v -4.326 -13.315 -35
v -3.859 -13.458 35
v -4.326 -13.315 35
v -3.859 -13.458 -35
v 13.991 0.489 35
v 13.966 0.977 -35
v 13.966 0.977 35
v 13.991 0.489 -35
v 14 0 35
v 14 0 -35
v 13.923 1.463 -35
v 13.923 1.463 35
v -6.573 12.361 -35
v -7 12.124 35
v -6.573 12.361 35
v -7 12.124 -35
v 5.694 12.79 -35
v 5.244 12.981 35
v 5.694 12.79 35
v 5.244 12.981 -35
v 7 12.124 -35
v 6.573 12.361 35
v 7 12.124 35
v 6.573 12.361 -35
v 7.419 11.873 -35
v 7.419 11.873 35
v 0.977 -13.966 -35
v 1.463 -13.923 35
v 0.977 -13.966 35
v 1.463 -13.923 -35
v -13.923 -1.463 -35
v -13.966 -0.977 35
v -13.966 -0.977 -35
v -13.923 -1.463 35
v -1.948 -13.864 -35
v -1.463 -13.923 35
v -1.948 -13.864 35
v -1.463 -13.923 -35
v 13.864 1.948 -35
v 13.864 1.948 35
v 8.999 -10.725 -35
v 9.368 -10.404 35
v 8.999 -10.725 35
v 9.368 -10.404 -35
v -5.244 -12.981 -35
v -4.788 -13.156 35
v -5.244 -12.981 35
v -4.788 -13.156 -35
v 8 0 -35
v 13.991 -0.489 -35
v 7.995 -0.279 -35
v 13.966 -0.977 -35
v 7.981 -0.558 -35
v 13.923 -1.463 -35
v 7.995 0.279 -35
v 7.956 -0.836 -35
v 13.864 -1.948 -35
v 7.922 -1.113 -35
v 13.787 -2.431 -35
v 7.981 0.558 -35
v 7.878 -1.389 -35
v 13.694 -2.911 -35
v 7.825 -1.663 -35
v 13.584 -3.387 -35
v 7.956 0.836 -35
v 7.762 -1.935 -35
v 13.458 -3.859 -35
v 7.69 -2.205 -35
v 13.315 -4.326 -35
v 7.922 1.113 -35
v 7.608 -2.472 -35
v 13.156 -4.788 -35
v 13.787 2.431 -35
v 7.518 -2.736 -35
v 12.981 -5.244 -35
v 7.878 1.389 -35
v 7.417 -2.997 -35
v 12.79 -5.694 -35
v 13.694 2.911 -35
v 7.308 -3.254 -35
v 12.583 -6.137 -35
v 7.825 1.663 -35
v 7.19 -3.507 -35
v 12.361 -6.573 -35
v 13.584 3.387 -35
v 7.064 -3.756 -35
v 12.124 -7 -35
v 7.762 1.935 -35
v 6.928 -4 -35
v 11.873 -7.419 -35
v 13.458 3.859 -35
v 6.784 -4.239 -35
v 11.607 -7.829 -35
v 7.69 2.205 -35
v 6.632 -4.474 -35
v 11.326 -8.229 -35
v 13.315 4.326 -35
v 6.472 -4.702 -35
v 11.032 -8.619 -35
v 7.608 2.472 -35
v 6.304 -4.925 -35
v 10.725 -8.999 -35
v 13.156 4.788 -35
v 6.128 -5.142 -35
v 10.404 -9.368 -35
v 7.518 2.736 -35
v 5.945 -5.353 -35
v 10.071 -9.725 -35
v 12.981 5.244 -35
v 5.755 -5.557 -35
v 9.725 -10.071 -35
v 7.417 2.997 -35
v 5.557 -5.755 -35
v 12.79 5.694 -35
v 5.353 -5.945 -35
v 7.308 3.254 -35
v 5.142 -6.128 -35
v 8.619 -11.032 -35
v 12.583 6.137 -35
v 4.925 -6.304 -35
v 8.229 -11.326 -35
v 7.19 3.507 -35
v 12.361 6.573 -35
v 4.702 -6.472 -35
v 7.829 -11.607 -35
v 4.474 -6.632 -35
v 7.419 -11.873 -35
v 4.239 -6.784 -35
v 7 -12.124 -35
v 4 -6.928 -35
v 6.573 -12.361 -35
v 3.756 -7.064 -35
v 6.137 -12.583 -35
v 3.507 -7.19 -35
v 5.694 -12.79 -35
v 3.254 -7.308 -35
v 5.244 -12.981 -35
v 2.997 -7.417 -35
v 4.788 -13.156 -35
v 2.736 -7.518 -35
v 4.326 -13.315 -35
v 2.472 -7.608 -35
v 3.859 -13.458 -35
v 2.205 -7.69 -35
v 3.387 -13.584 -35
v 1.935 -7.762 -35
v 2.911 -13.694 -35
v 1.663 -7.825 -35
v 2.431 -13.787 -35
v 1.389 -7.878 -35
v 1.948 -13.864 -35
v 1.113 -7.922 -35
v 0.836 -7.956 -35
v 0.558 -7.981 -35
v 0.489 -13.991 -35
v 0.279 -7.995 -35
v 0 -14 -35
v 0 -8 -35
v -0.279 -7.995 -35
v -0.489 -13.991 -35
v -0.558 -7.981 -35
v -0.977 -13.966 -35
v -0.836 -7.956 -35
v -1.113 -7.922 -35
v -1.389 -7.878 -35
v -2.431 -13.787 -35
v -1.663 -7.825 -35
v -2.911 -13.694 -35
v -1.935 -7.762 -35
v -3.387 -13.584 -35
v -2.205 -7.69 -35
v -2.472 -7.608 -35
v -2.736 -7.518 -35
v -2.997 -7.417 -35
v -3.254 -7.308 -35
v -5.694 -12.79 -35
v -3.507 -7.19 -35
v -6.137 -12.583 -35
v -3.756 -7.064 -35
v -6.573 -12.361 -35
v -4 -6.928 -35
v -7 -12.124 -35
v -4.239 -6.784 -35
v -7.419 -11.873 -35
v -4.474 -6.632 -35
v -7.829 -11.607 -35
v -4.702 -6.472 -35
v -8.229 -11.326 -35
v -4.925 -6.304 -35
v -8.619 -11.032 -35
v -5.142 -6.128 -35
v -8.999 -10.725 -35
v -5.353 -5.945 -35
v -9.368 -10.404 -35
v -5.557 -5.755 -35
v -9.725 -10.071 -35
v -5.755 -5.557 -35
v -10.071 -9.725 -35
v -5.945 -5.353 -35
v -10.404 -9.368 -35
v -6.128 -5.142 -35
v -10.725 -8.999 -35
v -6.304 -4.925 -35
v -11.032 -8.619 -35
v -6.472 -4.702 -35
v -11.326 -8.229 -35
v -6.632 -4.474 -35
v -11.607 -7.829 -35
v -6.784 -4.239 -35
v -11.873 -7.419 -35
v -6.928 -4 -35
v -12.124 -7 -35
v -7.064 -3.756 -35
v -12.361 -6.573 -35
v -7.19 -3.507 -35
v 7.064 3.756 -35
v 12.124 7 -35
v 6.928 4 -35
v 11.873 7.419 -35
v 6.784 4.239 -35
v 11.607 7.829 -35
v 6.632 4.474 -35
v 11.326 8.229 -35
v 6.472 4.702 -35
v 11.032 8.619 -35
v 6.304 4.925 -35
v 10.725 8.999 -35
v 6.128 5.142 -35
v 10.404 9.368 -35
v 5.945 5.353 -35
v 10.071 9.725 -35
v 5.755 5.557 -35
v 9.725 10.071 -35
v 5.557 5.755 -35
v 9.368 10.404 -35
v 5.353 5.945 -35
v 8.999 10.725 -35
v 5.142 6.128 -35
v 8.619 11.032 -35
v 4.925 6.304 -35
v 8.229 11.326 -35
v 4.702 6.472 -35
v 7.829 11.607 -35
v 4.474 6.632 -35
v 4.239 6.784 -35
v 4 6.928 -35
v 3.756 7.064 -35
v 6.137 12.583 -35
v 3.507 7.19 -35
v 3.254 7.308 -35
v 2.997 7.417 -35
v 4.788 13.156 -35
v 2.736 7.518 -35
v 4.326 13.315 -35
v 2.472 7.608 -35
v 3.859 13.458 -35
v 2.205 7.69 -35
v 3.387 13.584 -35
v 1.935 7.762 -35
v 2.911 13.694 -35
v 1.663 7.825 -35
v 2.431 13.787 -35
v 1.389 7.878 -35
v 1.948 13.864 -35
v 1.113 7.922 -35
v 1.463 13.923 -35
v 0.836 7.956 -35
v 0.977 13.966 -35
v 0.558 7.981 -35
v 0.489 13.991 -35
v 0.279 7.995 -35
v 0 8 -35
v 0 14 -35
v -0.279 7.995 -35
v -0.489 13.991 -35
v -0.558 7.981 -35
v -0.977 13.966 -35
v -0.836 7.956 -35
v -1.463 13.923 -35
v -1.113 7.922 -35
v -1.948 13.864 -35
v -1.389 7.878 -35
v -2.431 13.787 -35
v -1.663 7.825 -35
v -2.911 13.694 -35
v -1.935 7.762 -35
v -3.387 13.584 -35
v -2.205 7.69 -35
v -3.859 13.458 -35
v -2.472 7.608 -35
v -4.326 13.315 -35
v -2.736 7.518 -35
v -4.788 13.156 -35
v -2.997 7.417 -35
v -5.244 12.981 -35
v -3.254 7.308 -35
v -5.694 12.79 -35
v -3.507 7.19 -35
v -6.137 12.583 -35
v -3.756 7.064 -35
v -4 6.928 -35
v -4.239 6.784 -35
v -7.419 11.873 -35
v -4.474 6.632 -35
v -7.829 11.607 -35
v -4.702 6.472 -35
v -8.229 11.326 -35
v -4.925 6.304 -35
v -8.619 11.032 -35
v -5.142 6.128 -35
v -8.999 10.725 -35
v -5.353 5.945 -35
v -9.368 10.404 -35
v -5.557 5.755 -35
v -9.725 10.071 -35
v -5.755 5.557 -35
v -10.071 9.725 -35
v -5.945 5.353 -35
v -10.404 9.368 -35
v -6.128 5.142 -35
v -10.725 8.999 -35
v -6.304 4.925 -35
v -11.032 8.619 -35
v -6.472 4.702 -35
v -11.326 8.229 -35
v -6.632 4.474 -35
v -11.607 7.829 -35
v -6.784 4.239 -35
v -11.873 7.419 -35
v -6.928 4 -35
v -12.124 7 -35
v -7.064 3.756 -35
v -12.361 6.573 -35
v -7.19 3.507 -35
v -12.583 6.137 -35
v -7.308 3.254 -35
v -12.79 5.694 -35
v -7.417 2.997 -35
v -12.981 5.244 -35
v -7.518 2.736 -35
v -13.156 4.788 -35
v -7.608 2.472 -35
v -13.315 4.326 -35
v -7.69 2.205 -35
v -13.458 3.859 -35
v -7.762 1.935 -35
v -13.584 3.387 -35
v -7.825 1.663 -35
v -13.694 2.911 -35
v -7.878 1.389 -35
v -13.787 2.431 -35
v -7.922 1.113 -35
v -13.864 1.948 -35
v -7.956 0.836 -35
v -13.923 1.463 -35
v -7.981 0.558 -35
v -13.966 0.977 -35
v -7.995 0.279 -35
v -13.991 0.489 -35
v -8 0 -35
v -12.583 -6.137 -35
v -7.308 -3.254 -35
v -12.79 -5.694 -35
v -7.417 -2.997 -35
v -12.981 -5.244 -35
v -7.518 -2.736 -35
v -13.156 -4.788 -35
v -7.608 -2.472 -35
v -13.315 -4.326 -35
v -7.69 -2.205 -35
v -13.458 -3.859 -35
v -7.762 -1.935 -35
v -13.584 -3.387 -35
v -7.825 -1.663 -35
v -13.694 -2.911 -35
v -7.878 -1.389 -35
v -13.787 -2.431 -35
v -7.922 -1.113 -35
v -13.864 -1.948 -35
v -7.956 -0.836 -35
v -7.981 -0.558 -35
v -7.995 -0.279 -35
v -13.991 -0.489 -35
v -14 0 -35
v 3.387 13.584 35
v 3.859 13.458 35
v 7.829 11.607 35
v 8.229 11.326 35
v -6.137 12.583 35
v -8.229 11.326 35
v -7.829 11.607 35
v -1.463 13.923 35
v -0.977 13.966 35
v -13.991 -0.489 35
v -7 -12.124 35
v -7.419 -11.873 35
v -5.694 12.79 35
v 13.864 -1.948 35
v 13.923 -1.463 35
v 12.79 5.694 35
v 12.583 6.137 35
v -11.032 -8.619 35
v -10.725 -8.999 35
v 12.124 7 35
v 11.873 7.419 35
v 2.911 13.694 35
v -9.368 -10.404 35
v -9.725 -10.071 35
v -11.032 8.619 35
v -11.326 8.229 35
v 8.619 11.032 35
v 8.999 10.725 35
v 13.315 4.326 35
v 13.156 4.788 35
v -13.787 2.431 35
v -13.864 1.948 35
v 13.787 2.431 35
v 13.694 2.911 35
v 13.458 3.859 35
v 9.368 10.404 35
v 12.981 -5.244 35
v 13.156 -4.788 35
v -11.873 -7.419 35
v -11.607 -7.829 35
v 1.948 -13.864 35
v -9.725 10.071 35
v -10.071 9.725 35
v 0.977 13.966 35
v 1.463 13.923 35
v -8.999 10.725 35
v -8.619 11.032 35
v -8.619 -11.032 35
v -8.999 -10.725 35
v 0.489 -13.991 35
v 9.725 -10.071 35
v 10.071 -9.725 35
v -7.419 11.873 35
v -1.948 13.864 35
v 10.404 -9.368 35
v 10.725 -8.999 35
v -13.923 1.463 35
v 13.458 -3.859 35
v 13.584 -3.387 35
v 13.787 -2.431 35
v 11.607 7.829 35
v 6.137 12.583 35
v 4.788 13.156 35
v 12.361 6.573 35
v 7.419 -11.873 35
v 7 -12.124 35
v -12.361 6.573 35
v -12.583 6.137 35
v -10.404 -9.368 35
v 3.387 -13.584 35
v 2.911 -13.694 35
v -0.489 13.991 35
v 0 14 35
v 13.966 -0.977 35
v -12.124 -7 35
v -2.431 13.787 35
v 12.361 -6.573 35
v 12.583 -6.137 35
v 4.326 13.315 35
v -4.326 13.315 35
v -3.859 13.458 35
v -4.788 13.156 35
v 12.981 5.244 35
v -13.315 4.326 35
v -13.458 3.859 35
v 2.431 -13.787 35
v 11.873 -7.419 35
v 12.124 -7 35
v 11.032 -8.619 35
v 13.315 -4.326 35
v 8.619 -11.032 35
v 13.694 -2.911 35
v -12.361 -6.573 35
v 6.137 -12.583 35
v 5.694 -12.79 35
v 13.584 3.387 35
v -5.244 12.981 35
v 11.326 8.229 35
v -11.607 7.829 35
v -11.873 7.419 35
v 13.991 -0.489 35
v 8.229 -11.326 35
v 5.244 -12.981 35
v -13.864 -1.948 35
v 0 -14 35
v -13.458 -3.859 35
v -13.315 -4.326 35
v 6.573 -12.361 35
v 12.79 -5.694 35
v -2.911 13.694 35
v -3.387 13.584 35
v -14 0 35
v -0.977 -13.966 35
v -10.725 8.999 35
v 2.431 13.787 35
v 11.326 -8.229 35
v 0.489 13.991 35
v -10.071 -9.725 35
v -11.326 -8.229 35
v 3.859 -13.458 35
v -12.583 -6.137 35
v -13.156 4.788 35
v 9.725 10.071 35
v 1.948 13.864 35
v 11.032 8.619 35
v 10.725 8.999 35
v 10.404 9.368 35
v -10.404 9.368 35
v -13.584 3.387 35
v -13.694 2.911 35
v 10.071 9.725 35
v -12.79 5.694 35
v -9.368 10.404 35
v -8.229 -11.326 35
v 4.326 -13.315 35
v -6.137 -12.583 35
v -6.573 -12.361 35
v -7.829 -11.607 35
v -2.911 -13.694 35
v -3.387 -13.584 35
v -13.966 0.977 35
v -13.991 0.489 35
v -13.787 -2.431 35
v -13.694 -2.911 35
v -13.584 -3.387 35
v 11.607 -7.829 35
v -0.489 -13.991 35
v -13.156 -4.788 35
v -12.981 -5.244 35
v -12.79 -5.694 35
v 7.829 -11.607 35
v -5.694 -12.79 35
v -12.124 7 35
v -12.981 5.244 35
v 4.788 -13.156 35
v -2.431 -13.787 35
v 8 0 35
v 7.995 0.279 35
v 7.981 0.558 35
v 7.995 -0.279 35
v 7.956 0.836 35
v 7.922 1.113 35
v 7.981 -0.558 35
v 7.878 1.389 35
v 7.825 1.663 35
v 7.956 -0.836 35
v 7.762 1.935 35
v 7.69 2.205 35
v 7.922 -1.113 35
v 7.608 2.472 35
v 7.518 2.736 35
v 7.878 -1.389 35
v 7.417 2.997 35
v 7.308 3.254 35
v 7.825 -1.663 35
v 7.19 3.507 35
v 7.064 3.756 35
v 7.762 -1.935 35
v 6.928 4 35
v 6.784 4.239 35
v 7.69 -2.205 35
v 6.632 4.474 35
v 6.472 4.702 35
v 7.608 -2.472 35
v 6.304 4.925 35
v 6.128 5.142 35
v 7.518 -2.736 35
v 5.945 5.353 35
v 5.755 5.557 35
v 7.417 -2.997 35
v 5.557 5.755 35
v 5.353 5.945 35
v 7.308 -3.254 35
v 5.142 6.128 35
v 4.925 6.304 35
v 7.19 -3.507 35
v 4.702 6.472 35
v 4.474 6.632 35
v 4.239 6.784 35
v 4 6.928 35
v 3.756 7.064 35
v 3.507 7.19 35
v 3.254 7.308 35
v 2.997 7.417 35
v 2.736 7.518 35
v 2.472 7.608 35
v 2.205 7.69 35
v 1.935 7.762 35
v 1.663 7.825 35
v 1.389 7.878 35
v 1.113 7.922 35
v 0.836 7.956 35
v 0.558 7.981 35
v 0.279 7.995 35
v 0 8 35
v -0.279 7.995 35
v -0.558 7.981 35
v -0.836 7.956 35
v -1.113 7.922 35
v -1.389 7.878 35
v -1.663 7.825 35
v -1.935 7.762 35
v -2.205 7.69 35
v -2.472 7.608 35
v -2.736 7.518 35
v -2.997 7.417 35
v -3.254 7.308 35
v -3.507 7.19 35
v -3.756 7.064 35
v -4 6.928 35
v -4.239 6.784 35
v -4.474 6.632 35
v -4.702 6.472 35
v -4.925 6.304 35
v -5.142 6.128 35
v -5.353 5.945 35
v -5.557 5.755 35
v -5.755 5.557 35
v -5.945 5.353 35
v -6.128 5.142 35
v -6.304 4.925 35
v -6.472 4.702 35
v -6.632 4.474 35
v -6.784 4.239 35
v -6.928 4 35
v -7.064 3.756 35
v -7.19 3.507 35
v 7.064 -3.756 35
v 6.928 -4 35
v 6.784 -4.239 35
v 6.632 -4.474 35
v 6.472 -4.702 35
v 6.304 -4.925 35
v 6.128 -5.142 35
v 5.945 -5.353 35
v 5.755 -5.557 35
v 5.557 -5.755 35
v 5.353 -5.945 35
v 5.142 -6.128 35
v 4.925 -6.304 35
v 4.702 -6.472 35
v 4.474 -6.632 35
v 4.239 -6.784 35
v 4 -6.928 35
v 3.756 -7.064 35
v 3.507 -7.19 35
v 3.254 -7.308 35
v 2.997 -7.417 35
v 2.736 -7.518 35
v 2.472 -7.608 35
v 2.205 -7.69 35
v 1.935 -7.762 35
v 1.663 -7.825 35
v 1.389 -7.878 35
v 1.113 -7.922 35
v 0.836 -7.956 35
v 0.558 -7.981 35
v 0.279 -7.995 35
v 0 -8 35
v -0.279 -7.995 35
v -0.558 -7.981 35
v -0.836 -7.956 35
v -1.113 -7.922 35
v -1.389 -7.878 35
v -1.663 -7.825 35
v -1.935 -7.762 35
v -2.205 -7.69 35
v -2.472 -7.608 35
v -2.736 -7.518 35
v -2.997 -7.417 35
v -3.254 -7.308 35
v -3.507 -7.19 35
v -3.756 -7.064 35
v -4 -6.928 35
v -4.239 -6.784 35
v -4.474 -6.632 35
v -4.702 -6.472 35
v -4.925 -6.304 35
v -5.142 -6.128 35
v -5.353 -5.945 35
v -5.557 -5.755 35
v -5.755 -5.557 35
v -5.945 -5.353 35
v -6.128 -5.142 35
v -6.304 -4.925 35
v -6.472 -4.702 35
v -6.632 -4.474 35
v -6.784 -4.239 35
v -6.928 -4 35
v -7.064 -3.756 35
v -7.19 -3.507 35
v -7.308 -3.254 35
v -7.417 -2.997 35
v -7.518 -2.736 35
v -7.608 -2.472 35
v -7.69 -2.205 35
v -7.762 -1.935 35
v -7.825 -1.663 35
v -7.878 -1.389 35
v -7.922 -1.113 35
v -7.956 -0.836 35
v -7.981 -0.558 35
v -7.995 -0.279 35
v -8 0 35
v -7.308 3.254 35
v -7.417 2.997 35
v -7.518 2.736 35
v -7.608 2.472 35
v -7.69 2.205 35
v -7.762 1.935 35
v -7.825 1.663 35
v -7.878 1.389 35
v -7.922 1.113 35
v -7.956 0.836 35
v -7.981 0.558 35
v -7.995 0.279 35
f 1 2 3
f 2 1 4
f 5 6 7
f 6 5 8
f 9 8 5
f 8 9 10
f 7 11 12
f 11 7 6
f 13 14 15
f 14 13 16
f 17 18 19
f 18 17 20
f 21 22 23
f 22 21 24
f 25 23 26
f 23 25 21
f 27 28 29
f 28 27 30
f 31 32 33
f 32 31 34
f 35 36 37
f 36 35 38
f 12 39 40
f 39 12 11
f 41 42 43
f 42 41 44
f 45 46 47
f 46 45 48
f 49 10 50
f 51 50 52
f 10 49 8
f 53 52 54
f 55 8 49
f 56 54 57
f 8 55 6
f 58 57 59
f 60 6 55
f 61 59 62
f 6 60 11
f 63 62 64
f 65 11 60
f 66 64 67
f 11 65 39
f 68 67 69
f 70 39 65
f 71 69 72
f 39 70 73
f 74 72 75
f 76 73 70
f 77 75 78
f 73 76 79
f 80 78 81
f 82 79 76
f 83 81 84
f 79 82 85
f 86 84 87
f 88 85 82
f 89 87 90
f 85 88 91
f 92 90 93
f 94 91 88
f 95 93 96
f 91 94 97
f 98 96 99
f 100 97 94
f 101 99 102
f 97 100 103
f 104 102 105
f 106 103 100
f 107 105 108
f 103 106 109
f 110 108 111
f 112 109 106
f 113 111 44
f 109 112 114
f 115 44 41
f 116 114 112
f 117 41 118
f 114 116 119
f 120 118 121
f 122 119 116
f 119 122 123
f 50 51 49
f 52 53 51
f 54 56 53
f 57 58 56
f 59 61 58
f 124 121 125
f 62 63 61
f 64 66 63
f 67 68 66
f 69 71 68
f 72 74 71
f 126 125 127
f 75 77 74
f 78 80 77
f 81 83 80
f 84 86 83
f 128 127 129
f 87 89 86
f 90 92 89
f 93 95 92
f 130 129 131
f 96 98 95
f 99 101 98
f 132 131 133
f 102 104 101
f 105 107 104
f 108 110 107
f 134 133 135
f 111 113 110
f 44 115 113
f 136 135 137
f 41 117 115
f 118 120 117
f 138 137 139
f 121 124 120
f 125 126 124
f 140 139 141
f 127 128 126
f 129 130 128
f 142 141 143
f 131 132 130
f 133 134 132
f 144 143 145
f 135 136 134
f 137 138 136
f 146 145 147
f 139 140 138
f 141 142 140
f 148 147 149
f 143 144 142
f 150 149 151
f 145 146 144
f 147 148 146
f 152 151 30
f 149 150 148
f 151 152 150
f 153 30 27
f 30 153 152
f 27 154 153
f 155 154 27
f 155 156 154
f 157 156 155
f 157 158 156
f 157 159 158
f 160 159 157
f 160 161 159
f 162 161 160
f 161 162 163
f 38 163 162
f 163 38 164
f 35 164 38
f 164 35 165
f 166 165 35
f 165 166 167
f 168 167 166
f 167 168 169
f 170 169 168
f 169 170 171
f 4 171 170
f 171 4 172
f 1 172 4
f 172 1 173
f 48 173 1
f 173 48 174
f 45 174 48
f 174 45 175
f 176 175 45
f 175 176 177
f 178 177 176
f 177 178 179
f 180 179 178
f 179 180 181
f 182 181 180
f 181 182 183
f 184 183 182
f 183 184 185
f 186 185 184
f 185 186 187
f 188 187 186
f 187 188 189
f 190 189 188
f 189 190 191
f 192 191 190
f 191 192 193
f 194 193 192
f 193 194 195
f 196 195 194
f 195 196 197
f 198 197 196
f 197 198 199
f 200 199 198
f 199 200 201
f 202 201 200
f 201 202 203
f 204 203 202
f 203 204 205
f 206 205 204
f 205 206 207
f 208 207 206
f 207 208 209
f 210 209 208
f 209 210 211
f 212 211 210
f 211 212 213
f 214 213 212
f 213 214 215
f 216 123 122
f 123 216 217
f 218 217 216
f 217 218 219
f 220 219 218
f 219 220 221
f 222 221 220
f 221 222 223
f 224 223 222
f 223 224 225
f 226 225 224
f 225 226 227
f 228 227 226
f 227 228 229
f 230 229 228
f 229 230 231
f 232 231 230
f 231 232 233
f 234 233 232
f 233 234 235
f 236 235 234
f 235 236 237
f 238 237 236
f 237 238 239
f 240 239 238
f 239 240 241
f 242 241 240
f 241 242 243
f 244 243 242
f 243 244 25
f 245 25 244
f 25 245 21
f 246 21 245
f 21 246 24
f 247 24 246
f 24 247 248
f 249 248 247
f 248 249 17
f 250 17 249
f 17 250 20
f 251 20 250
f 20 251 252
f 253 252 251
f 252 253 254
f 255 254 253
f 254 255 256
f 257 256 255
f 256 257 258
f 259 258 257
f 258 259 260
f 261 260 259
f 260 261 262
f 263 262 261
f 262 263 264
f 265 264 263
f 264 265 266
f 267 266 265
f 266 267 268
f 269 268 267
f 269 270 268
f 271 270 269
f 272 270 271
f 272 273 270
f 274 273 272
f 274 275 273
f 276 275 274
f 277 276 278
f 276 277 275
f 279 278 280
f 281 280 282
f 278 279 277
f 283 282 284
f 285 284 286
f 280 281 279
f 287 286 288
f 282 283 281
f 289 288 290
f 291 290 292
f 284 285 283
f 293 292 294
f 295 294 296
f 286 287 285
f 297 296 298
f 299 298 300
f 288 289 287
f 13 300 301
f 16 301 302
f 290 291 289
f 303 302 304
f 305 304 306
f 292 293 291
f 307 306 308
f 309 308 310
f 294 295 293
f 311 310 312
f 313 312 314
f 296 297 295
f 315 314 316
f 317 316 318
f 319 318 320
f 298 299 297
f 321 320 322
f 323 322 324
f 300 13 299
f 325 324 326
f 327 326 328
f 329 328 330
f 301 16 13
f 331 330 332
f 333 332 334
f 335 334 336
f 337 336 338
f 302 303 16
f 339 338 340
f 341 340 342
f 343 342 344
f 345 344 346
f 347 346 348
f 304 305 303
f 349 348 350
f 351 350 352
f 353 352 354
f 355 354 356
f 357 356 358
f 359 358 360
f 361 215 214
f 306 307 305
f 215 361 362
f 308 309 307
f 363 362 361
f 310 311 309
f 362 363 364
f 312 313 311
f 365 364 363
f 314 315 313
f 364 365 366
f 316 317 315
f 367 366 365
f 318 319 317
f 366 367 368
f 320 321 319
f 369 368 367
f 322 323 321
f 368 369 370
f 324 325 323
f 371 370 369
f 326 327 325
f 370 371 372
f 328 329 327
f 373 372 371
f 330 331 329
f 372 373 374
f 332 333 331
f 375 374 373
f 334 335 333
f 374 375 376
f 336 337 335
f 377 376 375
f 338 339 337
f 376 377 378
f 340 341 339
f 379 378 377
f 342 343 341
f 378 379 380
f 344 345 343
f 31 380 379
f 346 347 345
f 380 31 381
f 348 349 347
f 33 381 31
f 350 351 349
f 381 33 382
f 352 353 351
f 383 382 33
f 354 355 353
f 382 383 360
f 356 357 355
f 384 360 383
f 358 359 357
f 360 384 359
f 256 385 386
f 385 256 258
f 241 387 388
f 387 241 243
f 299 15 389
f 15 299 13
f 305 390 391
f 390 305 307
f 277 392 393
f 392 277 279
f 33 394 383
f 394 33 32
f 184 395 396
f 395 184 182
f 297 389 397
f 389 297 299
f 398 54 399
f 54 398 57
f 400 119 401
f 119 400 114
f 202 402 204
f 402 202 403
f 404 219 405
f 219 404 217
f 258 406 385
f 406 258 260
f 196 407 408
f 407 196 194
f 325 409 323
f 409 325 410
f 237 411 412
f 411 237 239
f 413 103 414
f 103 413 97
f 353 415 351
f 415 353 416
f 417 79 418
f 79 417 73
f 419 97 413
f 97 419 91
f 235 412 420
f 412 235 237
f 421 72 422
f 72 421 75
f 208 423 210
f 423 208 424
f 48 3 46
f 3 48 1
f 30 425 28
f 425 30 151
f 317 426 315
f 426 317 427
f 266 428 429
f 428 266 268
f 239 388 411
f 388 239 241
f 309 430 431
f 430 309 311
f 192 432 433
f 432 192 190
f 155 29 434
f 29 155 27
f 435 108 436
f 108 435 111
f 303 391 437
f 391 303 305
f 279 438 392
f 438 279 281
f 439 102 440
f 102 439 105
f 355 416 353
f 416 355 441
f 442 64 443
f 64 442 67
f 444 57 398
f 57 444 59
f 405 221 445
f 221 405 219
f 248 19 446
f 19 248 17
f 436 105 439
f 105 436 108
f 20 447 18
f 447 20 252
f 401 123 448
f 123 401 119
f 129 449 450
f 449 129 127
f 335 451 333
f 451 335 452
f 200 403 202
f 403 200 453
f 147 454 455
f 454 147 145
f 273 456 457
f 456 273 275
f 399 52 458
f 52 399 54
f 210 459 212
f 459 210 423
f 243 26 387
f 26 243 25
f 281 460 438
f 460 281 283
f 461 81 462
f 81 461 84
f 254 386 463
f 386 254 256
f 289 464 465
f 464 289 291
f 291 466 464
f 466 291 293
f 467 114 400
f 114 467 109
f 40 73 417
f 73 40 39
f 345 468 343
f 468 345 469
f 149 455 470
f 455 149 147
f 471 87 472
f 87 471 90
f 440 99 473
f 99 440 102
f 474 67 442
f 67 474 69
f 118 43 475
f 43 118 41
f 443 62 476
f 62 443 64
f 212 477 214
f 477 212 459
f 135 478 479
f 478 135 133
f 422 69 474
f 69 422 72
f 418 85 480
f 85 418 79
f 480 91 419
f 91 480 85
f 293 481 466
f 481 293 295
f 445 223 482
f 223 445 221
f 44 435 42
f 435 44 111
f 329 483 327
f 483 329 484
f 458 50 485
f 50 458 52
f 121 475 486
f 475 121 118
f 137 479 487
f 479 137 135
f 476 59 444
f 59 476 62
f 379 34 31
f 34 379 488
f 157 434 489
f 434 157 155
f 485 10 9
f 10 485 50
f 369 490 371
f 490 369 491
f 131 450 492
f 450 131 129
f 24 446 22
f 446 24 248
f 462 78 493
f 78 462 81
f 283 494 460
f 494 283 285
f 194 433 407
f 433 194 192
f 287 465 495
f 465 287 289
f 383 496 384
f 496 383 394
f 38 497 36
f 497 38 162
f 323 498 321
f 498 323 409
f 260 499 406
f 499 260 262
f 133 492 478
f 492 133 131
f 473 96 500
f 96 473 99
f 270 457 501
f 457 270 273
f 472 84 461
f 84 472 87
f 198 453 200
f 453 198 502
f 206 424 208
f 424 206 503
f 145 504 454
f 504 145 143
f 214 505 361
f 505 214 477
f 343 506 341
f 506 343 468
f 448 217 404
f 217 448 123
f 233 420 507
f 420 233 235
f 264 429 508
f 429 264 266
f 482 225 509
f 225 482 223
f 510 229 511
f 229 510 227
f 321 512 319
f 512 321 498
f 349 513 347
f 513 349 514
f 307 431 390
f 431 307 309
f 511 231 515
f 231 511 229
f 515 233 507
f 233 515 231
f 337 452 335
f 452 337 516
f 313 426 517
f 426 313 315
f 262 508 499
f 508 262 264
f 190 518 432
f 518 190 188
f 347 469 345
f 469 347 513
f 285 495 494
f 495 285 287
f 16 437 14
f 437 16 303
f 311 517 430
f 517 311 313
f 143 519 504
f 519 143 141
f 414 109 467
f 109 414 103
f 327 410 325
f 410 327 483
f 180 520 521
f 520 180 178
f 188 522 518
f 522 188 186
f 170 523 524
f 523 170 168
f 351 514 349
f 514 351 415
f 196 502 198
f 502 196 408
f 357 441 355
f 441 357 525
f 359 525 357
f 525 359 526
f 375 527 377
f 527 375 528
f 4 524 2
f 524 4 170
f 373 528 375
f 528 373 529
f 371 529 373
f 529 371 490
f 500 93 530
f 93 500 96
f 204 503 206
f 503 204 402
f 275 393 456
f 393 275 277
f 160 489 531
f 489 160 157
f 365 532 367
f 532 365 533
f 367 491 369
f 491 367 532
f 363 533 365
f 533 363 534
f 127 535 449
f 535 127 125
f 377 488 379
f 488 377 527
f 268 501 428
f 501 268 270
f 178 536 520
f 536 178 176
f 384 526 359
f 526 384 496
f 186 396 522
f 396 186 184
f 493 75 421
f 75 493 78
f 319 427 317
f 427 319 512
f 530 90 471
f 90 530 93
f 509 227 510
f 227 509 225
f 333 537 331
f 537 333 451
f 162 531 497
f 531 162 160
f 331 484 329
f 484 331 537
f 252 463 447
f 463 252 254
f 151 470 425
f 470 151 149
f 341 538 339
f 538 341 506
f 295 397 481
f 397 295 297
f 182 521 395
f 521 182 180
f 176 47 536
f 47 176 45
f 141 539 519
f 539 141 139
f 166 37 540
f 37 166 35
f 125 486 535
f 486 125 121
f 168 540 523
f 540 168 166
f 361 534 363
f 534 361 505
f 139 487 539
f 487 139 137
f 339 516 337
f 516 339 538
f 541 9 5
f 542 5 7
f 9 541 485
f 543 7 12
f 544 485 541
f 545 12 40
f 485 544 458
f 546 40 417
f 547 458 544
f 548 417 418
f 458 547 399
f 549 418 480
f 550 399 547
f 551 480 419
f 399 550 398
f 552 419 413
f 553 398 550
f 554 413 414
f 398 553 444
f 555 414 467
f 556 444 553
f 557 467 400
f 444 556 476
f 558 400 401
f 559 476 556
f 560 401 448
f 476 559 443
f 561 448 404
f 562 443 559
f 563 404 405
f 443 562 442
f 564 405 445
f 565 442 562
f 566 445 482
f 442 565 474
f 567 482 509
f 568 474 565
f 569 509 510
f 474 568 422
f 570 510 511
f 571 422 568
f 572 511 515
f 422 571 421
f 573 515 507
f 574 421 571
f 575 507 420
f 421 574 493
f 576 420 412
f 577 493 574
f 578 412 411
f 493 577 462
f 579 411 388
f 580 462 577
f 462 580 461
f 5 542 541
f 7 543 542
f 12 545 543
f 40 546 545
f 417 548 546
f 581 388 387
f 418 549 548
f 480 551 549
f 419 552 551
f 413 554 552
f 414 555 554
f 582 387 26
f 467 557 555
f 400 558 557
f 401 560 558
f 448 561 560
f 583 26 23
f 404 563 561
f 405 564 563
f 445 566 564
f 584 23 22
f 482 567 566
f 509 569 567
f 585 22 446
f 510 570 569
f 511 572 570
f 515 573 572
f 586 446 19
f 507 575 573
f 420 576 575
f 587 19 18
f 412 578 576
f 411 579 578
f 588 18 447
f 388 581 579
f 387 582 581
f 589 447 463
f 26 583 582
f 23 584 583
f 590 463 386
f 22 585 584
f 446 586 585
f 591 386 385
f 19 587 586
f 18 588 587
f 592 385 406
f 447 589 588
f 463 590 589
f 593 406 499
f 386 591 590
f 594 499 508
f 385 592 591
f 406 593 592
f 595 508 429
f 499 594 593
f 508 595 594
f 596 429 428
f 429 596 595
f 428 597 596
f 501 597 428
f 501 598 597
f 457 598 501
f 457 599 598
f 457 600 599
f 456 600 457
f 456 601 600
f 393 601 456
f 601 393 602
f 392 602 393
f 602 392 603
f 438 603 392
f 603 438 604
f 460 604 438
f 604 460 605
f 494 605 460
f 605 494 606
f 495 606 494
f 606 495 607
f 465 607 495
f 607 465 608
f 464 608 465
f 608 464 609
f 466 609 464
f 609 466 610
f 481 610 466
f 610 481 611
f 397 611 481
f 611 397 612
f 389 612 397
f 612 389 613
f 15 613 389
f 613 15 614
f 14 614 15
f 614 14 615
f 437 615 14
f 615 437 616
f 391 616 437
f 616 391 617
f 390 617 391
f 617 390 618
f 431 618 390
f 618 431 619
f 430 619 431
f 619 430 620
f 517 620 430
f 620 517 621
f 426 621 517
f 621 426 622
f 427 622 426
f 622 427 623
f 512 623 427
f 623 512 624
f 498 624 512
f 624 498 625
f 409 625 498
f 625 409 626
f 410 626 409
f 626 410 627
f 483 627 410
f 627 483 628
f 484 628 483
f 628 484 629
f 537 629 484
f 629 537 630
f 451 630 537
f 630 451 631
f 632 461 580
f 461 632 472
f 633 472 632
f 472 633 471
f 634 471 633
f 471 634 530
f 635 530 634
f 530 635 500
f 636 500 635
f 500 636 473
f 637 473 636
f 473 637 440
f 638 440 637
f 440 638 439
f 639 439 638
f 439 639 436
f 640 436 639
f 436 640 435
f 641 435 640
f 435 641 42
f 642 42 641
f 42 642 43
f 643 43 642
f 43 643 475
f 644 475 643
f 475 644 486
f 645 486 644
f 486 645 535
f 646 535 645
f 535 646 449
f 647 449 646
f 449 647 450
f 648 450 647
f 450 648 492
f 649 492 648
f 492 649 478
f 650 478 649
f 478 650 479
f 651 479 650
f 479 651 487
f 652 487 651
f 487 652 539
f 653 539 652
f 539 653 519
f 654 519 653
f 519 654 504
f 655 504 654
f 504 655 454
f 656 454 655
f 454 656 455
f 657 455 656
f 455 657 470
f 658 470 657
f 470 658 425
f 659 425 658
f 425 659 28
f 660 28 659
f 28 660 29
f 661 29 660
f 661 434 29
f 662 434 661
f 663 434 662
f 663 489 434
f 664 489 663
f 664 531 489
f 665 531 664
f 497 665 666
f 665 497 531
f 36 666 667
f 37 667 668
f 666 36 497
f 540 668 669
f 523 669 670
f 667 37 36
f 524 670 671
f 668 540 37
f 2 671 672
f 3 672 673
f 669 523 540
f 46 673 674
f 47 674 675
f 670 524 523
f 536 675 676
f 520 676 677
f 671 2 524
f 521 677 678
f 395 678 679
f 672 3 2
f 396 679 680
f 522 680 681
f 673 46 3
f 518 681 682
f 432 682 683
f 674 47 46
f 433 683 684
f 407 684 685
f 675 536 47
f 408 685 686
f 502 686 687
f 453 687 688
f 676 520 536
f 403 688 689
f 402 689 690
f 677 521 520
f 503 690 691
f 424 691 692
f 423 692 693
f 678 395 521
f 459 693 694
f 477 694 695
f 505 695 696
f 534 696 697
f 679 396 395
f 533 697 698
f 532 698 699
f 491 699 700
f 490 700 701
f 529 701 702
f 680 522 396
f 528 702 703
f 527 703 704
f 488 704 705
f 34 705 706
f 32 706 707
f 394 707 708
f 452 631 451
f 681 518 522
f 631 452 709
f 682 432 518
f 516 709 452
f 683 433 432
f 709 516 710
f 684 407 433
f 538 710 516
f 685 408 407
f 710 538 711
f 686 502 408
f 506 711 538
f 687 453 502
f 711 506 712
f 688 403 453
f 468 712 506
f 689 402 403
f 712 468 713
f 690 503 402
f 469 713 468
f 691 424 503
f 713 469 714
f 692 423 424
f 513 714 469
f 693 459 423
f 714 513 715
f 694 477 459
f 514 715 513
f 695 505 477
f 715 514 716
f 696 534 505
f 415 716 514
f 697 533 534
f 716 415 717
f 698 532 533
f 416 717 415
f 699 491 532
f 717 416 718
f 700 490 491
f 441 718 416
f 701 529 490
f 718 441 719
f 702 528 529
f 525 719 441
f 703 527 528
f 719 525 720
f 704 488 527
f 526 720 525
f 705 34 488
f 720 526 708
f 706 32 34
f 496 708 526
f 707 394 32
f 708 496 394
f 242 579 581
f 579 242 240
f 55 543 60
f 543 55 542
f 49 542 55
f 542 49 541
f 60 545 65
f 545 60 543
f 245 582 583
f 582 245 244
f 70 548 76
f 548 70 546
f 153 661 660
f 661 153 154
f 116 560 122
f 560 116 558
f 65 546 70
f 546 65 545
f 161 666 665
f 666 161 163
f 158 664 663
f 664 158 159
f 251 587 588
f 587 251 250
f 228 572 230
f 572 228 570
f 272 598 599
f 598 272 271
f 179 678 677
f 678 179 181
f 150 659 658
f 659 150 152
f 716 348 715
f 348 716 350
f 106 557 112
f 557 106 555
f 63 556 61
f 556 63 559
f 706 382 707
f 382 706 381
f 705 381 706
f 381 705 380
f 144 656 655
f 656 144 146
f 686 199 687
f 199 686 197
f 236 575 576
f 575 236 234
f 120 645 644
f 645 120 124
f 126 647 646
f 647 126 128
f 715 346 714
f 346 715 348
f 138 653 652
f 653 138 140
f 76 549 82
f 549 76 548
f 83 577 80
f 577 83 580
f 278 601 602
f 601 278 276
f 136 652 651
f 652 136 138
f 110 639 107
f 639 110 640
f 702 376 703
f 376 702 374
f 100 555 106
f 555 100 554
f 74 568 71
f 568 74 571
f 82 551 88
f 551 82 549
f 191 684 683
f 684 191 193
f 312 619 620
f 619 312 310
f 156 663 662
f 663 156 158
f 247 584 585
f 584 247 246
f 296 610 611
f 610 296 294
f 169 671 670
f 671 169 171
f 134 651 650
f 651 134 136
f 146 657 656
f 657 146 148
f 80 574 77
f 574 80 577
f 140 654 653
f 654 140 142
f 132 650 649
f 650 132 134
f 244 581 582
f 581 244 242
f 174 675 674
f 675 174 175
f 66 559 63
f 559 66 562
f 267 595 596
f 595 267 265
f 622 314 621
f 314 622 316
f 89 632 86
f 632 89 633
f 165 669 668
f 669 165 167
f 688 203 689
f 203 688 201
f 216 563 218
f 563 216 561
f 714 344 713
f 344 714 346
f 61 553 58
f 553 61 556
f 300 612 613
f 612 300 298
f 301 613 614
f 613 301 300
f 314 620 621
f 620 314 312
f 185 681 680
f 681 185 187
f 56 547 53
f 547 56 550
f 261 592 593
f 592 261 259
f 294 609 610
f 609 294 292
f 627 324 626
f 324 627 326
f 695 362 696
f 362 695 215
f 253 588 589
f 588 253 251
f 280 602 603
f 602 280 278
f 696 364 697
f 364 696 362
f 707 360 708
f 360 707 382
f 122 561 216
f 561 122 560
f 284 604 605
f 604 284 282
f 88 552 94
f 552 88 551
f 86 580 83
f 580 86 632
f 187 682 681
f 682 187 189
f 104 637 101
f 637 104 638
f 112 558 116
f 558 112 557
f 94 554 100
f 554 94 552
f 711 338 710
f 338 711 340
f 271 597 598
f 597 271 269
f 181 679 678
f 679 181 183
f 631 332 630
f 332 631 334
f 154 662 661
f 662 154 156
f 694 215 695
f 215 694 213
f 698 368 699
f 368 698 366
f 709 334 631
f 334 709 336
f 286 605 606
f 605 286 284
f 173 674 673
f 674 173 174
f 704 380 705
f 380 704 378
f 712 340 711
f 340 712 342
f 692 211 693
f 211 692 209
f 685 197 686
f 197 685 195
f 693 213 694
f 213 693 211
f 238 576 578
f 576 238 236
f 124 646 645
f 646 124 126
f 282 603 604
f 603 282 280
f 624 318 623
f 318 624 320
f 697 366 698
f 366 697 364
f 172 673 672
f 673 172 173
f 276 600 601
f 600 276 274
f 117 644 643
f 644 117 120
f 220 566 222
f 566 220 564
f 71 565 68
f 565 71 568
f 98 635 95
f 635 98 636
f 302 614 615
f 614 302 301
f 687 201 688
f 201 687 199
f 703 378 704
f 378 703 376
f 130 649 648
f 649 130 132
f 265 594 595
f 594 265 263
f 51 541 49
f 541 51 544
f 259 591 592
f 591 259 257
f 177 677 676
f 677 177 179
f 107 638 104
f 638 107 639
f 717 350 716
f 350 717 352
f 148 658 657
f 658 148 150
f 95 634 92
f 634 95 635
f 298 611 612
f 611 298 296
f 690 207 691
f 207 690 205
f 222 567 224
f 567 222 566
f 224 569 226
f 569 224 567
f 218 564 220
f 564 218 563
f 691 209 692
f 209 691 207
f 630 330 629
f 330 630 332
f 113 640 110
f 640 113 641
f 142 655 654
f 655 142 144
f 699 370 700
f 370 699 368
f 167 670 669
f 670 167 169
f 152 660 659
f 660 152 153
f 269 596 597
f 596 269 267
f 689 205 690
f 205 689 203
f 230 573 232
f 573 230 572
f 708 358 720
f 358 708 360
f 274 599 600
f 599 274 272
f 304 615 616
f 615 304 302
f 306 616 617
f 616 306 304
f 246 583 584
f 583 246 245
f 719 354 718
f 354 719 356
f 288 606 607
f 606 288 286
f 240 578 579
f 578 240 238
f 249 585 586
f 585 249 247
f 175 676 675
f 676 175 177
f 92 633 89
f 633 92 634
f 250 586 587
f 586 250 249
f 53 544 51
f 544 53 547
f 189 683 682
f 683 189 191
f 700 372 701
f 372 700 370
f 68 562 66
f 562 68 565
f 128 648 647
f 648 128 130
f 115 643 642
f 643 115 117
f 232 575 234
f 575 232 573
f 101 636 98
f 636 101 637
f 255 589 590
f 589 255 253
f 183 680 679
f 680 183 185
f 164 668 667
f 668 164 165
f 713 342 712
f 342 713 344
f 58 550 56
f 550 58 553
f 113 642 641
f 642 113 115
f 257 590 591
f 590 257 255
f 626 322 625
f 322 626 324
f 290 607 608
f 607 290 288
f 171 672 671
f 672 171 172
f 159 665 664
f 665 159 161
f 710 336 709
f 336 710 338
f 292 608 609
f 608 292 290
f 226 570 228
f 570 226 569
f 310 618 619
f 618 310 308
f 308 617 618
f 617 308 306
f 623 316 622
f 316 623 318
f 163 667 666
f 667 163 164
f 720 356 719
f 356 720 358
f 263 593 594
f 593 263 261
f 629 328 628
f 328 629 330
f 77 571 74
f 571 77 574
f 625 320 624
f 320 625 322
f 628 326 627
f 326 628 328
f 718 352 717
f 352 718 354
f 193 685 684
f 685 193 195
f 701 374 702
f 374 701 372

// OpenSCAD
// Long Linear Bearing (simple sleeve)
// Target: 16.0mm bore, 28.0mm OD, 70.0mm length
// One connected solid (single part), hollow through-bore.

bore_diameter_mm  = 16.0;  // mm
outer_diameter_mm = 28.0;  // mm
length_mm         = 70.0;  // mm

$fn = 180;

module long_linear_bearing(bore_d, outer_d, len) {
    eps = 0.05; // tiny extension to guarantee a clean through-hole

    // Build along Z, centered at origin
    difference() {
        cylinder(d=outer_d, h=len, center=true);
        cylinder(d=bore_d,  h=len + 2*eps, center=true);
    }
}

long_linear_bearing(bore_diameter_mm, outer_diameter_mm, length_mm);
